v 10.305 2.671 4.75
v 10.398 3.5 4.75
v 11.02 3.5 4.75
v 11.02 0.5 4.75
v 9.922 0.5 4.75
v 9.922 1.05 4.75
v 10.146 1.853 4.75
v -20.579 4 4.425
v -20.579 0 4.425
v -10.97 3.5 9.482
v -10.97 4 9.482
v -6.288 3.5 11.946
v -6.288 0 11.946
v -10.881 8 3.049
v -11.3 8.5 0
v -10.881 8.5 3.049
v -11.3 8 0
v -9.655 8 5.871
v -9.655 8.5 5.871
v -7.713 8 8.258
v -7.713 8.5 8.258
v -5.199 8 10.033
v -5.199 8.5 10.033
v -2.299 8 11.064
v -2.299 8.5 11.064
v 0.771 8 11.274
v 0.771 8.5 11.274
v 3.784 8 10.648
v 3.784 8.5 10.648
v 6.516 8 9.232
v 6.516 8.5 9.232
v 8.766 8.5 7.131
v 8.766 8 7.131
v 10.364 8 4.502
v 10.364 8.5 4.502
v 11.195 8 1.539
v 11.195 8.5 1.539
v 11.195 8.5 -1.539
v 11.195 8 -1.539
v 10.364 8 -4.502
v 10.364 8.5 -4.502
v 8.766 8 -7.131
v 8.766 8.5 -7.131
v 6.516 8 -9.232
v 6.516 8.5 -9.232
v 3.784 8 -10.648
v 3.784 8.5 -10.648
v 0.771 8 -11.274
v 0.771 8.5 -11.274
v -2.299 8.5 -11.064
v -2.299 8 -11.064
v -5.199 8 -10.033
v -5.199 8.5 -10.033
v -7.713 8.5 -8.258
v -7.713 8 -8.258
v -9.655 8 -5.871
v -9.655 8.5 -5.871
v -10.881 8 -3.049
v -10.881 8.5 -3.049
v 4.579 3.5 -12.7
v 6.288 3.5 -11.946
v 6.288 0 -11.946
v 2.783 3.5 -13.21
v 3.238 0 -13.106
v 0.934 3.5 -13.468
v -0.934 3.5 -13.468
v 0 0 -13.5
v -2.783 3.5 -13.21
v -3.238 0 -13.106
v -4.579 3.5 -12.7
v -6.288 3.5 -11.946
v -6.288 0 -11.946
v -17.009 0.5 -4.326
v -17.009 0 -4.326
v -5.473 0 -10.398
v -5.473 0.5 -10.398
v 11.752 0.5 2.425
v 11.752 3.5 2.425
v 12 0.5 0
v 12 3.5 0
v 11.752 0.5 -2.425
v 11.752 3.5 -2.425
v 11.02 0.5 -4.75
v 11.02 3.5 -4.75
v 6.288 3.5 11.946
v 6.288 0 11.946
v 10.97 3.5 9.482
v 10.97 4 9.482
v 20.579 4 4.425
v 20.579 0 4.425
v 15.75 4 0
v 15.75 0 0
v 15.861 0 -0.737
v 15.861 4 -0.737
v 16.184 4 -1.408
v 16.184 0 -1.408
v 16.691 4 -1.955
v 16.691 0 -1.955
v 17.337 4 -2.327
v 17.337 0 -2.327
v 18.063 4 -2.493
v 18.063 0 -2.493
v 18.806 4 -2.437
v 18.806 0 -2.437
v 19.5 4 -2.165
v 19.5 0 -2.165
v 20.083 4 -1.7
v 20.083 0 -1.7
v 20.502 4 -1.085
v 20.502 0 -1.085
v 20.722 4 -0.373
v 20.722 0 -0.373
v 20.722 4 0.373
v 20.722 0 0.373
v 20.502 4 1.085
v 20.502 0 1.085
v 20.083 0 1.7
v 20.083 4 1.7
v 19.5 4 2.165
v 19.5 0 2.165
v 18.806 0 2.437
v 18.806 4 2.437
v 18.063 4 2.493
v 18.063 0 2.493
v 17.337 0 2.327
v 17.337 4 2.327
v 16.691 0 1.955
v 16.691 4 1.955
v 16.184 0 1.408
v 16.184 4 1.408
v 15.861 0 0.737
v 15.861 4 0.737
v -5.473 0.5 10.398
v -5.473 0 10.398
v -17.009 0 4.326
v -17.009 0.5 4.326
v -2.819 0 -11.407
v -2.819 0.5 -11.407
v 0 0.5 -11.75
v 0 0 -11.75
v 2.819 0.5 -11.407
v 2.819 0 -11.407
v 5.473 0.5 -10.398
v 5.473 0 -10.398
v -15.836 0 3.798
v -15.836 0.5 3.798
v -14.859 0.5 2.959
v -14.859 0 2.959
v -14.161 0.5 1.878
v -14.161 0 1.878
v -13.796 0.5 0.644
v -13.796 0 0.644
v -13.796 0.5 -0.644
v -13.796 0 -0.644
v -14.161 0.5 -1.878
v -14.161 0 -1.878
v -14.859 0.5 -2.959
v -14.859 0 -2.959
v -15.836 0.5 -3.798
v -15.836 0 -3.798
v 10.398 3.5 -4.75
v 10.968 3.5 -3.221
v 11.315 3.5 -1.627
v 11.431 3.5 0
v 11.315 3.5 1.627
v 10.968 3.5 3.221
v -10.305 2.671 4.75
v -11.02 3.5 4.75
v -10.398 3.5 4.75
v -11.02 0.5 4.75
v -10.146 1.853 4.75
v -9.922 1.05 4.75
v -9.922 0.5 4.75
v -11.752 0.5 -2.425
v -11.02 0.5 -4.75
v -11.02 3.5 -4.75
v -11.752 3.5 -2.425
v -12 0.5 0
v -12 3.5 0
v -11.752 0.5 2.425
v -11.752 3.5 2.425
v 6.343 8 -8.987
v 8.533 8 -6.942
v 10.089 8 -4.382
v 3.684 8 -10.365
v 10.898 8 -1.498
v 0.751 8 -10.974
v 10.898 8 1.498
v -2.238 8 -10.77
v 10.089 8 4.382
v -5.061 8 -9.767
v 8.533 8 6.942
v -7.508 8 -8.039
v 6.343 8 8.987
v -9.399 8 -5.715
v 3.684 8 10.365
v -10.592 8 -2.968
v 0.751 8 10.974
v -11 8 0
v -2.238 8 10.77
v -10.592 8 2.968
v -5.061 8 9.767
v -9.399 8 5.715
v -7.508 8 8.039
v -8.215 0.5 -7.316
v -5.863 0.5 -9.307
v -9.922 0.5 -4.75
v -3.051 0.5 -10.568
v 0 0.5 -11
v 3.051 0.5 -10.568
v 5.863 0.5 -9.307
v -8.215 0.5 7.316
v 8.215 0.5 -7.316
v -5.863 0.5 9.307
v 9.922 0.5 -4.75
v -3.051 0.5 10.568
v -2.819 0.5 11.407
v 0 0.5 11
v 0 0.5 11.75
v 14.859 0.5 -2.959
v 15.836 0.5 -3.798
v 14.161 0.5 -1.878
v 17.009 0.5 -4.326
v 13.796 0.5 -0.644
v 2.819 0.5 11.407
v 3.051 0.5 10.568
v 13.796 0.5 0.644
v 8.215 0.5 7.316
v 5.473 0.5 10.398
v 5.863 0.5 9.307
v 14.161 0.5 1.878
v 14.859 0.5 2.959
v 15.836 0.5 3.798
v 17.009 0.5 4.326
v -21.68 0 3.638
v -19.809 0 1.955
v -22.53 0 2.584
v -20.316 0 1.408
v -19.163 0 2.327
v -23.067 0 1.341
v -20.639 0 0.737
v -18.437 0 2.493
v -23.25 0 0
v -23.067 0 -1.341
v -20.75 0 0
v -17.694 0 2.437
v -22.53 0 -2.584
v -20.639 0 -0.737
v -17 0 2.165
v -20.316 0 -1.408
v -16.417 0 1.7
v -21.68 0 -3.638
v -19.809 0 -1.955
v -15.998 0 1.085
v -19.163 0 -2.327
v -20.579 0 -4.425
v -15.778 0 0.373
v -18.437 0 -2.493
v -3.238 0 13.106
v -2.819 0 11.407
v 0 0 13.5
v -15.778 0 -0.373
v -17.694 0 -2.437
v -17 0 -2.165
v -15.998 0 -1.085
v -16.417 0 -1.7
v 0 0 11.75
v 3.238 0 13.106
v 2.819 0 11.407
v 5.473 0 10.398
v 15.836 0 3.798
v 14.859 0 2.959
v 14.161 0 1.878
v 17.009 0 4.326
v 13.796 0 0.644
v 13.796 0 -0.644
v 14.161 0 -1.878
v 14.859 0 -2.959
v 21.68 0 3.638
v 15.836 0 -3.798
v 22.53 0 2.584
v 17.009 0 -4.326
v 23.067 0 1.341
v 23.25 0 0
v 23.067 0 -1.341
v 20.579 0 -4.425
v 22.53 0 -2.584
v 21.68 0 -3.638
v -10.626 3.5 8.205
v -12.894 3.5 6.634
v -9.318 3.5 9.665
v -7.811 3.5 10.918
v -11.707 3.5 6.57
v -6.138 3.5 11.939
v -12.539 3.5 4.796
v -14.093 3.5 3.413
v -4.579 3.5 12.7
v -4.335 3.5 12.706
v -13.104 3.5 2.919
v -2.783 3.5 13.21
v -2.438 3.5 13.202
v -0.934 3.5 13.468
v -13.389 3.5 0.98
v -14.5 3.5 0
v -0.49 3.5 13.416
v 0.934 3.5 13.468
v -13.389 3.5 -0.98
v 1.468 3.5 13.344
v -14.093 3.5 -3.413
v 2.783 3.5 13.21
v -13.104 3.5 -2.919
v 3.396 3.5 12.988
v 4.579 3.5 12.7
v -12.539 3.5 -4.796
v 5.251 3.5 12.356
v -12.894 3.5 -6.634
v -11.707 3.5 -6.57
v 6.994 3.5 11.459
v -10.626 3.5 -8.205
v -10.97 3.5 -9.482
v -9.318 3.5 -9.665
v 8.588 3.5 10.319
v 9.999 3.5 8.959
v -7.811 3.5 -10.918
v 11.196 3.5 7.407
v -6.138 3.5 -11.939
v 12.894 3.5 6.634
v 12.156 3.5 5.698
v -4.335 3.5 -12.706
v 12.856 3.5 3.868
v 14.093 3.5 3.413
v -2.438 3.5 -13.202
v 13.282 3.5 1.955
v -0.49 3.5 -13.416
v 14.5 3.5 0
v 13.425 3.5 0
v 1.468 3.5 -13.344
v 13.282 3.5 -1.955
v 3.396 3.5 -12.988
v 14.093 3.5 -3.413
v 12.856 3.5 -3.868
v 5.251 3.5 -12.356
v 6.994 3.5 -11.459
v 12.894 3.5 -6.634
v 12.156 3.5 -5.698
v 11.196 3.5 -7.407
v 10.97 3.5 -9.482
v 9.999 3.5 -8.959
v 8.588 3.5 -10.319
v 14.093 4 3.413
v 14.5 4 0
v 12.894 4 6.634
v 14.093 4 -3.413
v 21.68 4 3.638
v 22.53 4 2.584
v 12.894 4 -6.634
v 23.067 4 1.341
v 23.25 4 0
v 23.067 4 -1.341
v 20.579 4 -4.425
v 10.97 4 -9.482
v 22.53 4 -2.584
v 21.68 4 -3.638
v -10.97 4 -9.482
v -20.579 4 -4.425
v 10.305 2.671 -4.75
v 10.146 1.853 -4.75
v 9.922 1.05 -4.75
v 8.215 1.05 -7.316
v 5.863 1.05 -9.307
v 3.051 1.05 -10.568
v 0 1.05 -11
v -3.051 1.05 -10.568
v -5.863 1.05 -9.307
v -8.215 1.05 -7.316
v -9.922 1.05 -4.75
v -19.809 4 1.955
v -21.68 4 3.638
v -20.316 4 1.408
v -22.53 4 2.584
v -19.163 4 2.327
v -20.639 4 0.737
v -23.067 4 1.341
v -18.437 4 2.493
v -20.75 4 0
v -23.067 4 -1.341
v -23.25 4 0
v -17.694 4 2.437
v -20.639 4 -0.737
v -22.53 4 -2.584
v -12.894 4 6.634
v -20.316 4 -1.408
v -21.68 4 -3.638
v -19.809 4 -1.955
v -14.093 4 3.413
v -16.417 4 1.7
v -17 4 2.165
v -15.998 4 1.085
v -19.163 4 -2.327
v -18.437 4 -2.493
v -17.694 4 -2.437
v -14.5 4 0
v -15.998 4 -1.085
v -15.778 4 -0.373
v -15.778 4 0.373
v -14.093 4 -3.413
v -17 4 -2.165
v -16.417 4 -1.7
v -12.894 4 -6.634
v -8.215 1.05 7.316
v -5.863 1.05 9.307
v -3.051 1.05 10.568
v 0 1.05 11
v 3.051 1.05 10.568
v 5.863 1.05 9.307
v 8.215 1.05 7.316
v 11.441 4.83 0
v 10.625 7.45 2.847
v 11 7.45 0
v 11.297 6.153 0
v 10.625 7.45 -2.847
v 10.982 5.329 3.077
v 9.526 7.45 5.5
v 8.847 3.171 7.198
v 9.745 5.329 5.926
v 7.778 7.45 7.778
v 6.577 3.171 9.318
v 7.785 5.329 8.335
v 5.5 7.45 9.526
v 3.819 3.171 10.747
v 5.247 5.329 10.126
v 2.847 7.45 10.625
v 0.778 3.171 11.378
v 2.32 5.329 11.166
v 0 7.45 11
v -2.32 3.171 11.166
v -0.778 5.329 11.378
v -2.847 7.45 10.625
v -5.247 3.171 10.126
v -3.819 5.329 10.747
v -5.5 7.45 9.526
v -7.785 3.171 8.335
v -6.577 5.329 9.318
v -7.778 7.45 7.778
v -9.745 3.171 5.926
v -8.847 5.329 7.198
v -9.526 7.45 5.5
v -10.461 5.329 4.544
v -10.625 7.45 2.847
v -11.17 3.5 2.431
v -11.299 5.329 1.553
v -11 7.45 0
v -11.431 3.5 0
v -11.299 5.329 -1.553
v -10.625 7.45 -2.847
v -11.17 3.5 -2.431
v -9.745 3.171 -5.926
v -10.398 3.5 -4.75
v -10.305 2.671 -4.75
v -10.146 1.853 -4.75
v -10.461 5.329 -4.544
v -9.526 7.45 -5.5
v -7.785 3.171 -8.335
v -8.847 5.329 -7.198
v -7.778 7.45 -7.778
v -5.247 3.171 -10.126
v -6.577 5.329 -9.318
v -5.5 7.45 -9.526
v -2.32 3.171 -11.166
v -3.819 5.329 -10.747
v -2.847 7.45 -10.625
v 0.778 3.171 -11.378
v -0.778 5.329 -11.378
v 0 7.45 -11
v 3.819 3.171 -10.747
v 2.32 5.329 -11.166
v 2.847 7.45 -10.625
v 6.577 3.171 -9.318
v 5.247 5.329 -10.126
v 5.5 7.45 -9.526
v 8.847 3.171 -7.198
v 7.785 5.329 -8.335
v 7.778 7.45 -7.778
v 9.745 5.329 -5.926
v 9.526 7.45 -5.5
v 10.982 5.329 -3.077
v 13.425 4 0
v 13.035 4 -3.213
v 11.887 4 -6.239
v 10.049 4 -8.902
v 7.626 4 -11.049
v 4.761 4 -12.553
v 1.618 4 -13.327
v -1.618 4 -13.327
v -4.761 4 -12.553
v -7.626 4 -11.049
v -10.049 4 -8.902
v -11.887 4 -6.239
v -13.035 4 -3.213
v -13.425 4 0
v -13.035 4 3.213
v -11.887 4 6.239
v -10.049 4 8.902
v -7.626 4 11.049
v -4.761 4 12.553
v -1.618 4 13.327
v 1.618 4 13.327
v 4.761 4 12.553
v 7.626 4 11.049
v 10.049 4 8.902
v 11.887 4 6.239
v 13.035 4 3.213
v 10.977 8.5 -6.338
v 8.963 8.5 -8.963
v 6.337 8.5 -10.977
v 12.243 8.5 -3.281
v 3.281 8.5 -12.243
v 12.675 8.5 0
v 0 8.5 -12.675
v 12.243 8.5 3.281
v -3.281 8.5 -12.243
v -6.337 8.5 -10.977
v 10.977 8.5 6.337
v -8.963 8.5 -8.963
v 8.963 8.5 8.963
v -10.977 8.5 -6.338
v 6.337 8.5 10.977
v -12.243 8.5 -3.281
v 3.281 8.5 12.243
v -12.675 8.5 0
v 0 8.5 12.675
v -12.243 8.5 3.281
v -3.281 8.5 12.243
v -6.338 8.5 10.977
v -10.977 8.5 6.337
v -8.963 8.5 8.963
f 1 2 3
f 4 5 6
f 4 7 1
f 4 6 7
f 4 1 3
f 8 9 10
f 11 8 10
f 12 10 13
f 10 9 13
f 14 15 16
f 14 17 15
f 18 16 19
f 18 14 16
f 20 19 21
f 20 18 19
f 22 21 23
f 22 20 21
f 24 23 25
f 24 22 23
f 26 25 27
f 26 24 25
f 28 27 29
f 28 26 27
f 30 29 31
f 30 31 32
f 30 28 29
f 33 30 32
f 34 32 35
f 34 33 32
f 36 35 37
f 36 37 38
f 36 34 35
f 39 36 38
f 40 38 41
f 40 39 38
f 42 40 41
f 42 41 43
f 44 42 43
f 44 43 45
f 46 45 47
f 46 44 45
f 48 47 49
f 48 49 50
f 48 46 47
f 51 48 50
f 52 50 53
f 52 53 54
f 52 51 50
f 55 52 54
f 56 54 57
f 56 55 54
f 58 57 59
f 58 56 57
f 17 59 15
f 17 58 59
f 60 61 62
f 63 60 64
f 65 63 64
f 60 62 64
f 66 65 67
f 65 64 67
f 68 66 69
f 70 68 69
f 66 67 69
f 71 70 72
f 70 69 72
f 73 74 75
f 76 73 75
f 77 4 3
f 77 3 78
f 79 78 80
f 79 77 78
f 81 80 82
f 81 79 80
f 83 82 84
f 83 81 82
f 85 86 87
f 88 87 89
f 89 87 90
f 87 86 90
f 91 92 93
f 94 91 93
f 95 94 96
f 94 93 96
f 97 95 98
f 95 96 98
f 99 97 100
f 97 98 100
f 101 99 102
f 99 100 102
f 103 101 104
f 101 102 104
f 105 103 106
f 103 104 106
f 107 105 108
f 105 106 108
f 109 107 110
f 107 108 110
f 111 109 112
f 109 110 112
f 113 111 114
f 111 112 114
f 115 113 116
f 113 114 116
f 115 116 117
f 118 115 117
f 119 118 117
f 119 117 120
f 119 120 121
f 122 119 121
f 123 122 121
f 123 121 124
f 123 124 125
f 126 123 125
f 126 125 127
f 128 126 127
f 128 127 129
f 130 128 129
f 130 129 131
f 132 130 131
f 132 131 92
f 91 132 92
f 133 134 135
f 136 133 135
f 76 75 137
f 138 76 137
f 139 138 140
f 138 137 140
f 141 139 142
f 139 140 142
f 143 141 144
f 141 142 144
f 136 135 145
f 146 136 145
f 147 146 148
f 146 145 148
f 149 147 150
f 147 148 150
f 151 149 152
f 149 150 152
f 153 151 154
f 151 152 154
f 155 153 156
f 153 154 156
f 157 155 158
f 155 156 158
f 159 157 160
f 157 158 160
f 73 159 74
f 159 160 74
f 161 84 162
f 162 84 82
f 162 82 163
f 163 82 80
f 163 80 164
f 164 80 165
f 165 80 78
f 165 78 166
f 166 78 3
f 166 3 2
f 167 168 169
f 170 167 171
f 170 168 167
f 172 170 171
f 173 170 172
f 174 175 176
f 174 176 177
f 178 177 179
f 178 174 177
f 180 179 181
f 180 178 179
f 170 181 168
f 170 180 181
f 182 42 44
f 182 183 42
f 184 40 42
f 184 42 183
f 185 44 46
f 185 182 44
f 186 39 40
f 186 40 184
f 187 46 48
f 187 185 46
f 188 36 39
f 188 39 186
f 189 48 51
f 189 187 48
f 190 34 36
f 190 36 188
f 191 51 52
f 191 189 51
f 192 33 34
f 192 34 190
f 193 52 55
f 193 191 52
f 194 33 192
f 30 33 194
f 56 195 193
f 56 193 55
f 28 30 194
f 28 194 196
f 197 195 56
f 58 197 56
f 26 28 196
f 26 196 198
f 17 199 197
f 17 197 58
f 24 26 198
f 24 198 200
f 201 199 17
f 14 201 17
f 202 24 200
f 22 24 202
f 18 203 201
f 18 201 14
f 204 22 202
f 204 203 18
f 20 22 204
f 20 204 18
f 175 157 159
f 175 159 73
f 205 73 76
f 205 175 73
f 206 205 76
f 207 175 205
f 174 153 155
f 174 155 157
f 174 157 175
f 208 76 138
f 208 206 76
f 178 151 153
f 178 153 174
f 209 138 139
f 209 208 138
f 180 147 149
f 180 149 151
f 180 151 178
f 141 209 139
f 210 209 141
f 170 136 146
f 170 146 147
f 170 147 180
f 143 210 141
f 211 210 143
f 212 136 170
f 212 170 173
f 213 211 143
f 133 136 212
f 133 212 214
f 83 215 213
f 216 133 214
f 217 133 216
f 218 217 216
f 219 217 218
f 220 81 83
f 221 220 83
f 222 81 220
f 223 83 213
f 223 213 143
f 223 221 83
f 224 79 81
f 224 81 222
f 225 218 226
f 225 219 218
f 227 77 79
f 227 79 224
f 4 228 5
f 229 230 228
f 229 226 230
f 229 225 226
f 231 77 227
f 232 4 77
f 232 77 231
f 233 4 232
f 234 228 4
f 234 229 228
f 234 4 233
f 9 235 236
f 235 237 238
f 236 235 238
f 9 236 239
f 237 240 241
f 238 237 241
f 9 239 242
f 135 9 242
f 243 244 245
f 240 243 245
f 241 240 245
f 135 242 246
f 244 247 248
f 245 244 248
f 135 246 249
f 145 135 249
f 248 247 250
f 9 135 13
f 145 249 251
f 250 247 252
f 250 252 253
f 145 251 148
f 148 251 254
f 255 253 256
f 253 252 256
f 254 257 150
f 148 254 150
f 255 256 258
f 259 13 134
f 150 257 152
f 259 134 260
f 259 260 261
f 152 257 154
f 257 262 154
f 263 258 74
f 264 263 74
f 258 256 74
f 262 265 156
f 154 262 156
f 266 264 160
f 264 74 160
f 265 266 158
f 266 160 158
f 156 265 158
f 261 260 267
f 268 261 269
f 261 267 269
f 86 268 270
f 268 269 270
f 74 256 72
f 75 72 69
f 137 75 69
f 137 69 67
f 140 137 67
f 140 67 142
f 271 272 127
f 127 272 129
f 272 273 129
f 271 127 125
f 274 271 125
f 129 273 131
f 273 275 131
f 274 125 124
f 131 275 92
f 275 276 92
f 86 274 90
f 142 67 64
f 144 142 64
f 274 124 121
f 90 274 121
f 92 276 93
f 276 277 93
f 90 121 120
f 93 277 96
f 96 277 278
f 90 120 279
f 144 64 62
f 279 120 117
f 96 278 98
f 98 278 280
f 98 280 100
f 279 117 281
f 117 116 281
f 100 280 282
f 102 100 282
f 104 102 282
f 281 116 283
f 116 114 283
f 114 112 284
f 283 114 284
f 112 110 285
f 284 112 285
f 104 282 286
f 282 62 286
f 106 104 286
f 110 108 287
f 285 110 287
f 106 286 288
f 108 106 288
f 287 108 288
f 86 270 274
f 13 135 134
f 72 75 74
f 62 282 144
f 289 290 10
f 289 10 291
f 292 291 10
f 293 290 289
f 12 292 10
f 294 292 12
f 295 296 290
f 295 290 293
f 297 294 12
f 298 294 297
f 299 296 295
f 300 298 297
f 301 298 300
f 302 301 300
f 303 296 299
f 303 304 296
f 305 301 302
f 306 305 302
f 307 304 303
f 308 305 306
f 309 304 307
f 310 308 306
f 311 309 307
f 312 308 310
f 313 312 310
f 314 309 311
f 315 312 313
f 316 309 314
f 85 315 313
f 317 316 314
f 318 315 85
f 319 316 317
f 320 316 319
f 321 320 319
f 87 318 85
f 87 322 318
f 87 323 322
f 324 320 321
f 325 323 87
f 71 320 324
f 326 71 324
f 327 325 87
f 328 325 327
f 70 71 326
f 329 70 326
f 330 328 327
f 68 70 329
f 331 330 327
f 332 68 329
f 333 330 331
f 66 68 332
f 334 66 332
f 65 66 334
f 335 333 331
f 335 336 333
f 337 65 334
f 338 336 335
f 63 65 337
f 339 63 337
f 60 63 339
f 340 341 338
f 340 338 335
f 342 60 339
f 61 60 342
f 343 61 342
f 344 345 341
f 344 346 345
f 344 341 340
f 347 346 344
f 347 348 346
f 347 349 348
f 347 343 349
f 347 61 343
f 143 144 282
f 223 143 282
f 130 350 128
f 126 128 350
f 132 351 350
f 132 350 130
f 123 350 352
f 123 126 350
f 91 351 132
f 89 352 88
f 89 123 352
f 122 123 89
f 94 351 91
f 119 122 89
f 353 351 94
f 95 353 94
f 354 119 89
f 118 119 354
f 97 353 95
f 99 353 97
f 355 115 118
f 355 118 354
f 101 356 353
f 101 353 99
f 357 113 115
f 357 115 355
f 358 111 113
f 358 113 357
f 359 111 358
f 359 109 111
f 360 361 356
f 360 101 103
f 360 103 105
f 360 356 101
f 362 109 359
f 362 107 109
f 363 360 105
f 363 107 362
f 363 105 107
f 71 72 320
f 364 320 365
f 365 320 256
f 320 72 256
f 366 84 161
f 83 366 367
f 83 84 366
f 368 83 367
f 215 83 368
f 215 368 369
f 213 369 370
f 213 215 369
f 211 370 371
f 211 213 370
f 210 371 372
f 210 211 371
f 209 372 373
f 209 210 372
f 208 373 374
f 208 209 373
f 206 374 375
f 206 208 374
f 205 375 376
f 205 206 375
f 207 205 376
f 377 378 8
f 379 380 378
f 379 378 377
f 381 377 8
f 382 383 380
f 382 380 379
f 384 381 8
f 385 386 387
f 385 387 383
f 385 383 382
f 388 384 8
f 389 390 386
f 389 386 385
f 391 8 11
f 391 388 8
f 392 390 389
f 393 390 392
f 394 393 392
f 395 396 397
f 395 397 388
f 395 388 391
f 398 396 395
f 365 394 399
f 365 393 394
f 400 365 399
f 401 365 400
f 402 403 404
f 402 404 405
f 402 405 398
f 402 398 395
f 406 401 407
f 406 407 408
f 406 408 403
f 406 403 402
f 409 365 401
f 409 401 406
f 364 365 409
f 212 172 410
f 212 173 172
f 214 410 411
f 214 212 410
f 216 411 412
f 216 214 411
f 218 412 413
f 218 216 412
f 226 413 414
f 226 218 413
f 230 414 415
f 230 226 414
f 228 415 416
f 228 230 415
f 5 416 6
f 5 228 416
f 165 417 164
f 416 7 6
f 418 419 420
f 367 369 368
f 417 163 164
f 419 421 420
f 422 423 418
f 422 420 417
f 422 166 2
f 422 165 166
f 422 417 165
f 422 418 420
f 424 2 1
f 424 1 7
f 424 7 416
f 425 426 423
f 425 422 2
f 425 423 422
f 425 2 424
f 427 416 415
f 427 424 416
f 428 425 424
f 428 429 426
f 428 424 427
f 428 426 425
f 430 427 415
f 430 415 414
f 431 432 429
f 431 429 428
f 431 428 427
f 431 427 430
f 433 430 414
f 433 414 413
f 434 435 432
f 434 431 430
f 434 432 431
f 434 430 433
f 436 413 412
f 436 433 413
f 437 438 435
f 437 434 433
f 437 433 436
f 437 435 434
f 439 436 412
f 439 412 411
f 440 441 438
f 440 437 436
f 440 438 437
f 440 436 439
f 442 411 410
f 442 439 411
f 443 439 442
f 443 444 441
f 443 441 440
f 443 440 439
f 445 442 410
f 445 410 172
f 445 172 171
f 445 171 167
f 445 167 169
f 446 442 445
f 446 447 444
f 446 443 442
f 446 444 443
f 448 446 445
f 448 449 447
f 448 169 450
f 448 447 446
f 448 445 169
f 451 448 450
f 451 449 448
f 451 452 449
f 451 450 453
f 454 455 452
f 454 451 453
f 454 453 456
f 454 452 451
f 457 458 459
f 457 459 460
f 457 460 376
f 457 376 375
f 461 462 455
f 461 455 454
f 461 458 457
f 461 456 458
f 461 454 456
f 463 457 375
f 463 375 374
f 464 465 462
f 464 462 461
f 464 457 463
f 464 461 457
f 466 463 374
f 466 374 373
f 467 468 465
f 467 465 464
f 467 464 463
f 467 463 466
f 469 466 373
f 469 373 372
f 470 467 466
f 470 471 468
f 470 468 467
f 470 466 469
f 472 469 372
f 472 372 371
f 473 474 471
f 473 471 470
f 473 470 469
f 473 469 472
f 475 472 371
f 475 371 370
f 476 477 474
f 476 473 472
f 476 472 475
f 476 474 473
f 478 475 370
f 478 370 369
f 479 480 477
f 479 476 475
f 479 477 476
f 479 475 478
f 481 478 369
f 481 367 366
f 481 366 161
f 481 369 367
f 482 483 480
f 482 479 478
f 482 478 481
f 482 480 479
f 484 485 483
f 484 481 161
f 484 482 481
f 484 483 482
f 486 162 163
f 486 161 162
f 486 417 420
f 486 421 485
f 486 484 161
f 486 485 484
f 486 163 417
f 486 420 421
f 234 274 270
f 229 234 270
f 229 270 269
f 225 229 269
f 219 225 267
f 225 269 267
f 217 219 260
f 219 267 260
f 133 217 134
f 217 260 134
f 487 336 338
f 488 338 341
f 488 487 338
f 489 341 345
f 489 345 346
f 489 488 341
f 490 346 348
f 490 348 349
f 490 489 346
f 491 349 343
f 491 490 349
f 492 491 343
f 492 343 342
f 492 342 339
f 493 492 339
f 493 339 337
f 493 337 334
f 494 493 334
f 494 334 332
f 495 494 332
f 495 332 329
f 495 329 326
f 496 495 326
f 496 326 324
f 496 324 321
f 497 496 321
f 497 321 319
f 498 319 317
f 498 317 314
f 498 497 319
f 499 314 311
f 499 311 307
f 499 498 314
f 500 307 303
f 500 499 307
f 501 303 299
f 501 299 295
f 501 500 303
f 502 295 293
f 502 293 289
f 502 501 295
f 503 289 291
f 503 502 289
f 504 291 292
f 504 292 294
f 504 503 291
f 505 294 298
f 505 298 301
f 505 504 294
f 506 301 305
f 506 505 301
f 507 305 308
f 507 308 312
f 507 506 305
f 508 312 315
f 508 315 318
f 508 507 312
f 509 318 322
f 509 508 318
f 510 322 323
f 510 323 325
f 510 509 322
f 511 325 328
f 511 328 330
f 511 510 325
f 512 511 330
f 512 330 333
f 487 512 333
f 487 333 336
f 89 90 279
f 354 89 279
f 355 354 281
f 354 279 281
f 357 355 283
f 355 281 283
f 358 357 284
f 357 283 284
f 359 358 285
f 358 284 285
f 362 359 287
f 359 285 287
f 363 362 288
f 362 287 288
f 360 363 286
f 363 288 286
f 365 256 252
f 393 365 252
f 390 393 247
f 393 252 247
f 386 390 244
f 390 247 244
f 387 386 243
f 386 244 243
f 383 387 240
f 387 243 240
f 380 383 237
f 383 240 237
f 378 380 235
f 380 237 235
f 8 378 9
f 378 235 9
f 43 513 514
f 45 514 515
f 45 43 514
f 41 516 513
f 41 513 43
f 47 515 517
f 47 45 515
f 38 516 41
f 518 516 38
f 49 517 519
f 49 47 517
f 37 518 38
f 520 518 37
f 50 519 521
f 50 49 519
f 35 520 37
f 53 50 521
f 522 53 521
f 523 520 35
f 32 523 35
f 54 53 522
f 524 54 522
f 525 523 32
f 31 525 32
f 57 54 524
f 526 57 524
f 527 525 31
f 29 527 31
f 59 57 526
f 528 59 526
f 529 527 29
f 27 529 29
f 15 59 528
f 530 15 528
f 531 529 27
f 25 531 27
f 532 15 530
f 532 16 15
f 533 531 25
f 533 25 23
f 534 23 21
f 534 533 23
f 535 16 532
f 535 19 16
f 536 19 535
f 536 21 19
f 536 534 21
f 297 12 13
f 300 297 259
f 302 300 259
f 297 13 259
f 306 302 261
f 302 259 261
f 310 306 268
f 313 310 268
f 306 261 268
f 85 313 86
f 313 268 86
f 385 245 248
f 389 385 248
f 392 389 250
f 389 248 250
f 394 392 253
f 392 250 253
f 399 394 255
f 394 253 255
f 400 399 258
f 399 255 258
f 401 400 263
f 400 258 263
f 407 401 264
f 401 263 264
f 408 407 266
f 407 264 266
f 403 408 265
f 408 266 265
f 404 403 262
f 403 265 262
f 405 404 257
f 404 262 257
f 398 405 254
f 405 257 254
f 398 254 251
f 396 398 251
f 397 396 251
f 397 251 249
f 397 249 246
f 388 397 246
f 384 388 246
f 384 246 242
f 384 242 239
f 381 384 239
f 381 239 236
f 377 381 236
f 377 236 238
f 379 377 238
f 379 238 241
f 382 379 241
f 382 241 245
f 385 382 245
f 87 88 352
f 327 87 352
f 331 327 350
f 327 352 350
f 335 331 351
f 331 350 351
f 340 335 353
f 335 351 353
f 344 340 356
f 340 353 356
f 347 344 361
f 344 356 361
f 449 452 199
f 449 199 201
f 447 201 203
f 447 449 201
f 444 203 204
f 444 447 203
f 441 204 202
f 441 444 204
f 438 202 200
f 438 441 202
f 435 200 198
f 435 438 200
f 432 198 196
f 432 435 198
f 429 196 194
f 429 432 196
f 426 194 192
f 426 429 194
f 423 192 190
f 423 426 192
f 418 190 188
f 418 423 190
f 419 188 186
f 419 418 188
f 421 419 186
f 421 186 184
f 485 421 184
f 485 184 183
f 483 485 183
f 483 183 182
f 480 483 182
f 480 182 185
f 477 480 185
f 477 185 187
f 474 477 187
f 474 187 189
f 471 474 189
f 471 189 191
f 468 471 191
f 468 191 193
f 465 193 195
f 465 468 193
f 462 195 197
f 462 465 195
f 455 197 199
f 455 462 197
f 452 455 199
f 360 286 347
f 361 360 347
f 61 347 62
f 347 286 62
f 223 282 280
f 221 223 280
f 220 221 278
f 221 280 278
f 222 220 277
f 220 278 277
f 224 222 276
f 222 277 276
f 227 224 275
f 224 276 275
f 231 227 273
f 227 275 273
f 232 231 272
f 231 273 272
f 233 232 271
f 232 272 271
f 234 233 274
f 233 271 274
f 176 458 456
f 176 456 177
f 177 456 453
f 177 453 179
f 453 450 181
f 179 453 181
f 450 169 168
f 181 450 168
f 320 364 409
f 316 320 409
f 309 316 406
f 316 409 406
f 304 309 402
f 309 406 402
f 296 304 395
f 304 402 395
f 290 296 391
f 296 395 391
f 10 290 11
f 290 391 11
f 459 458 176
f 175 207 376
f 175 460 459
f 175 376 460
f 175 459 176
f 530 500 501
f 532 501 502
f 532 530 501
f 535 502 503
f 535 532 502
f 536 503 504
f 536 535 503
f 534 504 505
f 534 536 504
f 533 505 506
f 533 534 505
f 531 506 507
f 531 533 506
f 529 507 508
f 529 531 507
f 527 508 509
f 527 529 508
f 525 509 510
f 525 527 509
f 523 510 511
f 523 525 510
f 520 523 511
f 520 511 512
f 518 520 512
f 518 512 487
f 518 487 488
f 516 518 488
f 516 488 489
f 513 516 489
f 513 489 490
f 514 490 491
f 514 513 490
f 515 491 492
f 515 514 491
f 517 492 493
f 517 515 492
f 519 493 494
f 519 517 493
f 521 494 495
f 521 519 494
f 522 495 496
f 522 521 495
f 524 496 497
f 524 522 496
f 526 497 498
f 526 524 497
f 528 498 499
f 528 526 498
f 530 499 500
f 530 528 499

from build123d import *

# Parameters (mm, degrees)
SKETCH1_R              = 11
FLANGE_DEPTH           = 4
TOP_START              = -0.5
SKETCH3_R              = 13.425
TOP_RECESS_DEPTH       = 0.5
BOTTOM_RECESS_1_DEPTH  = 0.5
BOTTOM_RECESS_2_DEPTH  = 3
MOUNTING_HOLE_M5X0_8_D = 5


with BuildPart() as part:
    # Sketch1 → Flange (new body)
    with BuildSketch(Plane(origin=(0, 0, 0), x_dir=(1, 0, 0), z_dir=(0, 1, 0))):
        with BuildLine():
            Line((20.578767123, 4.424572712), (6.287671233, 11.946346323))
            ThreePointArc((6.287671233, 11.946346323), (0, 13.5), (-6.287671233, 11.946346323))
            Line((-6.287671233, 11.946346323), (-20.578767123, 4.424572712))
            ThreePointArc((-20.578767123, 4.424572712), (-23.25, 0), (-20.578767123, -4.424572712))
            Line((-20.578767123, -4.424572712), (-6.287671233, -11.946346323))
            ThreePointArc((-6.287671233, -11.946346323), (0, -13.5), (6.287671233, -11.946346323))
            Line((6.287671233, -11.946346323), (20.578767123, -4.424572712))
            ThreePointArc((20.578767123, -4.424572712), (23.25, 0), (20.578767123, 4.424572712))
        make_face()
        Circle(SKETCH1_R, mode=Mode.SUBTRACT)
    extrude(amount=FLANGE_DEPTH)

    # Sketch2 → Bearing Seat (revolve)
    with BuildSketch(Plane.XY):
        Polygon((-13.425, 4), (-12.675, 8.5), (-11.3, 8.5), (-11.3, 8), (-11, 8), (-11, 4), align=None)
    revolve(axis=Axis((0, 0, 0), (0, 1, 0)))

    # Sketch3 → Top Recess (cut)
    with BuildSketch(Plane(origin=(0, 4, 0), x_dir=(1, 0, 0), z_dir=(0, 1, 0)).offset(TOP_START)):
        with BuildLine():
            Line((10.970198855, 9.481810855), (6.287671233, 11.946346323))
            ThreePointArc((6.287671233, 11.946346323), (0, 13.5), (-6.287671233, 11.946346323))
            Line((-6.287671233, 11.946346323), (-10.970198855, 9.481810855))
            ThreePointArc((-10.970198855, 9.481810855), (-14.5, 0), (-10.970198855, -9.481810855))
            Line((-10.970198855, -9.481810855), (-6.287671233, -11.946346323))
            ThreePointArc((-6.287671233, -11.946346323), (0, -13.5), (6.287671233, -11.946346323))
            Line((6.287671233, -11.946346323), (10.970198855, -9.481810855))
            ThreePointArc((10.970198855, -9.481810855), (14.5, 0), (10.970198855, 9.481810855))
        make_face()
        Circle(SKETCH3_R, mode=Mode.SUBTRACT)
    extrude(amount=TOP_RECESS_DEPTH, mode=Mode.SUBTRACT)

    # Sketch5 → Bottom Recess 1 (cut)
    with BuildSketch(Plane.XZ):
        with BuildLine():
            Line((17.009424329, 4.325618107), (5.47260274, 10.397745874))
            ThreePointArc((5.47260274, 10.397745874), (0, 11.75), (-5.47260274, 10.397745874))
            Line((-5.47260274, 10.397745874), (-17.009424329, 4.325618107))
            ThreePointArc((-17.009424329, 4.325618107), (-13.75, 0), (-17.009424329, -4.325618107))
            Line((-17.009424329, -4.325618107), (-5.47260274, -10.397745874))
            ThreePointArc((-5.47260274, -10.397745874), (0, -11.75), (5.47260274, -10.397745874))
            Line((5.47260274, -10.397745874), (17.009424329, -4.325618107))
            ThreePointArc((17.009424329, -4.325618107), (13.75, 0), (17.009424329, 4.325618107))
        make_face()
    extrude(amount=-BOTTOM_RECESS_1_DEPTH, mode=Mode.SUBTRACT)

    # Sketch6 → Bottom Recess 2 (cut)
    with BuildSketch(Plane.XZ.offset(-0.5)):
        with BuildLine():
            Line((-11.01986842, 4.75), (11.01986842, 4.75))
            ThreePointArc((11.01986842, 4.75), (12, 0), (11.01986842, -4.75))
            Line((11.01986842, -4.75), (-11.01986842, -4.75))
            ThreePointArc((-11.01986842, -4.75), (-12, 0), (-11.01986842, 4.75))
        make_face()
    extrude(amount=-BOTTOM_RECESS_2_DEPTH, mode=Mode.SUBTRACT)

    # Mounting Hole (M5x0.8) (through all)
    with Locations(Plane(origin=(0, 4, 0), x_dir=(1, 0, 0), z_dir=(0, 1, 0))):
        with Locations((18.25, 0), (-18.25, 0)):
            Hole(MOUNTING_HOLE_M5X0_8_D / 2)

    # Sketch11 → Cut-Revolve1 (revolve, cut)
    with BuildSketch(Plane.XY):
        with BuildLine():
            Line((0, 15.70600279), (0, -7.20600279))
            ThreePointArc((0, -7.20600279), (11.45600279, 4.25), (0, 15.70600279))
        make_face()
    revolve(axis=Axis((0, 8.5, 0), (0, -1, 0)), mode=Mode.SUBTRACT)


solid = part.part
